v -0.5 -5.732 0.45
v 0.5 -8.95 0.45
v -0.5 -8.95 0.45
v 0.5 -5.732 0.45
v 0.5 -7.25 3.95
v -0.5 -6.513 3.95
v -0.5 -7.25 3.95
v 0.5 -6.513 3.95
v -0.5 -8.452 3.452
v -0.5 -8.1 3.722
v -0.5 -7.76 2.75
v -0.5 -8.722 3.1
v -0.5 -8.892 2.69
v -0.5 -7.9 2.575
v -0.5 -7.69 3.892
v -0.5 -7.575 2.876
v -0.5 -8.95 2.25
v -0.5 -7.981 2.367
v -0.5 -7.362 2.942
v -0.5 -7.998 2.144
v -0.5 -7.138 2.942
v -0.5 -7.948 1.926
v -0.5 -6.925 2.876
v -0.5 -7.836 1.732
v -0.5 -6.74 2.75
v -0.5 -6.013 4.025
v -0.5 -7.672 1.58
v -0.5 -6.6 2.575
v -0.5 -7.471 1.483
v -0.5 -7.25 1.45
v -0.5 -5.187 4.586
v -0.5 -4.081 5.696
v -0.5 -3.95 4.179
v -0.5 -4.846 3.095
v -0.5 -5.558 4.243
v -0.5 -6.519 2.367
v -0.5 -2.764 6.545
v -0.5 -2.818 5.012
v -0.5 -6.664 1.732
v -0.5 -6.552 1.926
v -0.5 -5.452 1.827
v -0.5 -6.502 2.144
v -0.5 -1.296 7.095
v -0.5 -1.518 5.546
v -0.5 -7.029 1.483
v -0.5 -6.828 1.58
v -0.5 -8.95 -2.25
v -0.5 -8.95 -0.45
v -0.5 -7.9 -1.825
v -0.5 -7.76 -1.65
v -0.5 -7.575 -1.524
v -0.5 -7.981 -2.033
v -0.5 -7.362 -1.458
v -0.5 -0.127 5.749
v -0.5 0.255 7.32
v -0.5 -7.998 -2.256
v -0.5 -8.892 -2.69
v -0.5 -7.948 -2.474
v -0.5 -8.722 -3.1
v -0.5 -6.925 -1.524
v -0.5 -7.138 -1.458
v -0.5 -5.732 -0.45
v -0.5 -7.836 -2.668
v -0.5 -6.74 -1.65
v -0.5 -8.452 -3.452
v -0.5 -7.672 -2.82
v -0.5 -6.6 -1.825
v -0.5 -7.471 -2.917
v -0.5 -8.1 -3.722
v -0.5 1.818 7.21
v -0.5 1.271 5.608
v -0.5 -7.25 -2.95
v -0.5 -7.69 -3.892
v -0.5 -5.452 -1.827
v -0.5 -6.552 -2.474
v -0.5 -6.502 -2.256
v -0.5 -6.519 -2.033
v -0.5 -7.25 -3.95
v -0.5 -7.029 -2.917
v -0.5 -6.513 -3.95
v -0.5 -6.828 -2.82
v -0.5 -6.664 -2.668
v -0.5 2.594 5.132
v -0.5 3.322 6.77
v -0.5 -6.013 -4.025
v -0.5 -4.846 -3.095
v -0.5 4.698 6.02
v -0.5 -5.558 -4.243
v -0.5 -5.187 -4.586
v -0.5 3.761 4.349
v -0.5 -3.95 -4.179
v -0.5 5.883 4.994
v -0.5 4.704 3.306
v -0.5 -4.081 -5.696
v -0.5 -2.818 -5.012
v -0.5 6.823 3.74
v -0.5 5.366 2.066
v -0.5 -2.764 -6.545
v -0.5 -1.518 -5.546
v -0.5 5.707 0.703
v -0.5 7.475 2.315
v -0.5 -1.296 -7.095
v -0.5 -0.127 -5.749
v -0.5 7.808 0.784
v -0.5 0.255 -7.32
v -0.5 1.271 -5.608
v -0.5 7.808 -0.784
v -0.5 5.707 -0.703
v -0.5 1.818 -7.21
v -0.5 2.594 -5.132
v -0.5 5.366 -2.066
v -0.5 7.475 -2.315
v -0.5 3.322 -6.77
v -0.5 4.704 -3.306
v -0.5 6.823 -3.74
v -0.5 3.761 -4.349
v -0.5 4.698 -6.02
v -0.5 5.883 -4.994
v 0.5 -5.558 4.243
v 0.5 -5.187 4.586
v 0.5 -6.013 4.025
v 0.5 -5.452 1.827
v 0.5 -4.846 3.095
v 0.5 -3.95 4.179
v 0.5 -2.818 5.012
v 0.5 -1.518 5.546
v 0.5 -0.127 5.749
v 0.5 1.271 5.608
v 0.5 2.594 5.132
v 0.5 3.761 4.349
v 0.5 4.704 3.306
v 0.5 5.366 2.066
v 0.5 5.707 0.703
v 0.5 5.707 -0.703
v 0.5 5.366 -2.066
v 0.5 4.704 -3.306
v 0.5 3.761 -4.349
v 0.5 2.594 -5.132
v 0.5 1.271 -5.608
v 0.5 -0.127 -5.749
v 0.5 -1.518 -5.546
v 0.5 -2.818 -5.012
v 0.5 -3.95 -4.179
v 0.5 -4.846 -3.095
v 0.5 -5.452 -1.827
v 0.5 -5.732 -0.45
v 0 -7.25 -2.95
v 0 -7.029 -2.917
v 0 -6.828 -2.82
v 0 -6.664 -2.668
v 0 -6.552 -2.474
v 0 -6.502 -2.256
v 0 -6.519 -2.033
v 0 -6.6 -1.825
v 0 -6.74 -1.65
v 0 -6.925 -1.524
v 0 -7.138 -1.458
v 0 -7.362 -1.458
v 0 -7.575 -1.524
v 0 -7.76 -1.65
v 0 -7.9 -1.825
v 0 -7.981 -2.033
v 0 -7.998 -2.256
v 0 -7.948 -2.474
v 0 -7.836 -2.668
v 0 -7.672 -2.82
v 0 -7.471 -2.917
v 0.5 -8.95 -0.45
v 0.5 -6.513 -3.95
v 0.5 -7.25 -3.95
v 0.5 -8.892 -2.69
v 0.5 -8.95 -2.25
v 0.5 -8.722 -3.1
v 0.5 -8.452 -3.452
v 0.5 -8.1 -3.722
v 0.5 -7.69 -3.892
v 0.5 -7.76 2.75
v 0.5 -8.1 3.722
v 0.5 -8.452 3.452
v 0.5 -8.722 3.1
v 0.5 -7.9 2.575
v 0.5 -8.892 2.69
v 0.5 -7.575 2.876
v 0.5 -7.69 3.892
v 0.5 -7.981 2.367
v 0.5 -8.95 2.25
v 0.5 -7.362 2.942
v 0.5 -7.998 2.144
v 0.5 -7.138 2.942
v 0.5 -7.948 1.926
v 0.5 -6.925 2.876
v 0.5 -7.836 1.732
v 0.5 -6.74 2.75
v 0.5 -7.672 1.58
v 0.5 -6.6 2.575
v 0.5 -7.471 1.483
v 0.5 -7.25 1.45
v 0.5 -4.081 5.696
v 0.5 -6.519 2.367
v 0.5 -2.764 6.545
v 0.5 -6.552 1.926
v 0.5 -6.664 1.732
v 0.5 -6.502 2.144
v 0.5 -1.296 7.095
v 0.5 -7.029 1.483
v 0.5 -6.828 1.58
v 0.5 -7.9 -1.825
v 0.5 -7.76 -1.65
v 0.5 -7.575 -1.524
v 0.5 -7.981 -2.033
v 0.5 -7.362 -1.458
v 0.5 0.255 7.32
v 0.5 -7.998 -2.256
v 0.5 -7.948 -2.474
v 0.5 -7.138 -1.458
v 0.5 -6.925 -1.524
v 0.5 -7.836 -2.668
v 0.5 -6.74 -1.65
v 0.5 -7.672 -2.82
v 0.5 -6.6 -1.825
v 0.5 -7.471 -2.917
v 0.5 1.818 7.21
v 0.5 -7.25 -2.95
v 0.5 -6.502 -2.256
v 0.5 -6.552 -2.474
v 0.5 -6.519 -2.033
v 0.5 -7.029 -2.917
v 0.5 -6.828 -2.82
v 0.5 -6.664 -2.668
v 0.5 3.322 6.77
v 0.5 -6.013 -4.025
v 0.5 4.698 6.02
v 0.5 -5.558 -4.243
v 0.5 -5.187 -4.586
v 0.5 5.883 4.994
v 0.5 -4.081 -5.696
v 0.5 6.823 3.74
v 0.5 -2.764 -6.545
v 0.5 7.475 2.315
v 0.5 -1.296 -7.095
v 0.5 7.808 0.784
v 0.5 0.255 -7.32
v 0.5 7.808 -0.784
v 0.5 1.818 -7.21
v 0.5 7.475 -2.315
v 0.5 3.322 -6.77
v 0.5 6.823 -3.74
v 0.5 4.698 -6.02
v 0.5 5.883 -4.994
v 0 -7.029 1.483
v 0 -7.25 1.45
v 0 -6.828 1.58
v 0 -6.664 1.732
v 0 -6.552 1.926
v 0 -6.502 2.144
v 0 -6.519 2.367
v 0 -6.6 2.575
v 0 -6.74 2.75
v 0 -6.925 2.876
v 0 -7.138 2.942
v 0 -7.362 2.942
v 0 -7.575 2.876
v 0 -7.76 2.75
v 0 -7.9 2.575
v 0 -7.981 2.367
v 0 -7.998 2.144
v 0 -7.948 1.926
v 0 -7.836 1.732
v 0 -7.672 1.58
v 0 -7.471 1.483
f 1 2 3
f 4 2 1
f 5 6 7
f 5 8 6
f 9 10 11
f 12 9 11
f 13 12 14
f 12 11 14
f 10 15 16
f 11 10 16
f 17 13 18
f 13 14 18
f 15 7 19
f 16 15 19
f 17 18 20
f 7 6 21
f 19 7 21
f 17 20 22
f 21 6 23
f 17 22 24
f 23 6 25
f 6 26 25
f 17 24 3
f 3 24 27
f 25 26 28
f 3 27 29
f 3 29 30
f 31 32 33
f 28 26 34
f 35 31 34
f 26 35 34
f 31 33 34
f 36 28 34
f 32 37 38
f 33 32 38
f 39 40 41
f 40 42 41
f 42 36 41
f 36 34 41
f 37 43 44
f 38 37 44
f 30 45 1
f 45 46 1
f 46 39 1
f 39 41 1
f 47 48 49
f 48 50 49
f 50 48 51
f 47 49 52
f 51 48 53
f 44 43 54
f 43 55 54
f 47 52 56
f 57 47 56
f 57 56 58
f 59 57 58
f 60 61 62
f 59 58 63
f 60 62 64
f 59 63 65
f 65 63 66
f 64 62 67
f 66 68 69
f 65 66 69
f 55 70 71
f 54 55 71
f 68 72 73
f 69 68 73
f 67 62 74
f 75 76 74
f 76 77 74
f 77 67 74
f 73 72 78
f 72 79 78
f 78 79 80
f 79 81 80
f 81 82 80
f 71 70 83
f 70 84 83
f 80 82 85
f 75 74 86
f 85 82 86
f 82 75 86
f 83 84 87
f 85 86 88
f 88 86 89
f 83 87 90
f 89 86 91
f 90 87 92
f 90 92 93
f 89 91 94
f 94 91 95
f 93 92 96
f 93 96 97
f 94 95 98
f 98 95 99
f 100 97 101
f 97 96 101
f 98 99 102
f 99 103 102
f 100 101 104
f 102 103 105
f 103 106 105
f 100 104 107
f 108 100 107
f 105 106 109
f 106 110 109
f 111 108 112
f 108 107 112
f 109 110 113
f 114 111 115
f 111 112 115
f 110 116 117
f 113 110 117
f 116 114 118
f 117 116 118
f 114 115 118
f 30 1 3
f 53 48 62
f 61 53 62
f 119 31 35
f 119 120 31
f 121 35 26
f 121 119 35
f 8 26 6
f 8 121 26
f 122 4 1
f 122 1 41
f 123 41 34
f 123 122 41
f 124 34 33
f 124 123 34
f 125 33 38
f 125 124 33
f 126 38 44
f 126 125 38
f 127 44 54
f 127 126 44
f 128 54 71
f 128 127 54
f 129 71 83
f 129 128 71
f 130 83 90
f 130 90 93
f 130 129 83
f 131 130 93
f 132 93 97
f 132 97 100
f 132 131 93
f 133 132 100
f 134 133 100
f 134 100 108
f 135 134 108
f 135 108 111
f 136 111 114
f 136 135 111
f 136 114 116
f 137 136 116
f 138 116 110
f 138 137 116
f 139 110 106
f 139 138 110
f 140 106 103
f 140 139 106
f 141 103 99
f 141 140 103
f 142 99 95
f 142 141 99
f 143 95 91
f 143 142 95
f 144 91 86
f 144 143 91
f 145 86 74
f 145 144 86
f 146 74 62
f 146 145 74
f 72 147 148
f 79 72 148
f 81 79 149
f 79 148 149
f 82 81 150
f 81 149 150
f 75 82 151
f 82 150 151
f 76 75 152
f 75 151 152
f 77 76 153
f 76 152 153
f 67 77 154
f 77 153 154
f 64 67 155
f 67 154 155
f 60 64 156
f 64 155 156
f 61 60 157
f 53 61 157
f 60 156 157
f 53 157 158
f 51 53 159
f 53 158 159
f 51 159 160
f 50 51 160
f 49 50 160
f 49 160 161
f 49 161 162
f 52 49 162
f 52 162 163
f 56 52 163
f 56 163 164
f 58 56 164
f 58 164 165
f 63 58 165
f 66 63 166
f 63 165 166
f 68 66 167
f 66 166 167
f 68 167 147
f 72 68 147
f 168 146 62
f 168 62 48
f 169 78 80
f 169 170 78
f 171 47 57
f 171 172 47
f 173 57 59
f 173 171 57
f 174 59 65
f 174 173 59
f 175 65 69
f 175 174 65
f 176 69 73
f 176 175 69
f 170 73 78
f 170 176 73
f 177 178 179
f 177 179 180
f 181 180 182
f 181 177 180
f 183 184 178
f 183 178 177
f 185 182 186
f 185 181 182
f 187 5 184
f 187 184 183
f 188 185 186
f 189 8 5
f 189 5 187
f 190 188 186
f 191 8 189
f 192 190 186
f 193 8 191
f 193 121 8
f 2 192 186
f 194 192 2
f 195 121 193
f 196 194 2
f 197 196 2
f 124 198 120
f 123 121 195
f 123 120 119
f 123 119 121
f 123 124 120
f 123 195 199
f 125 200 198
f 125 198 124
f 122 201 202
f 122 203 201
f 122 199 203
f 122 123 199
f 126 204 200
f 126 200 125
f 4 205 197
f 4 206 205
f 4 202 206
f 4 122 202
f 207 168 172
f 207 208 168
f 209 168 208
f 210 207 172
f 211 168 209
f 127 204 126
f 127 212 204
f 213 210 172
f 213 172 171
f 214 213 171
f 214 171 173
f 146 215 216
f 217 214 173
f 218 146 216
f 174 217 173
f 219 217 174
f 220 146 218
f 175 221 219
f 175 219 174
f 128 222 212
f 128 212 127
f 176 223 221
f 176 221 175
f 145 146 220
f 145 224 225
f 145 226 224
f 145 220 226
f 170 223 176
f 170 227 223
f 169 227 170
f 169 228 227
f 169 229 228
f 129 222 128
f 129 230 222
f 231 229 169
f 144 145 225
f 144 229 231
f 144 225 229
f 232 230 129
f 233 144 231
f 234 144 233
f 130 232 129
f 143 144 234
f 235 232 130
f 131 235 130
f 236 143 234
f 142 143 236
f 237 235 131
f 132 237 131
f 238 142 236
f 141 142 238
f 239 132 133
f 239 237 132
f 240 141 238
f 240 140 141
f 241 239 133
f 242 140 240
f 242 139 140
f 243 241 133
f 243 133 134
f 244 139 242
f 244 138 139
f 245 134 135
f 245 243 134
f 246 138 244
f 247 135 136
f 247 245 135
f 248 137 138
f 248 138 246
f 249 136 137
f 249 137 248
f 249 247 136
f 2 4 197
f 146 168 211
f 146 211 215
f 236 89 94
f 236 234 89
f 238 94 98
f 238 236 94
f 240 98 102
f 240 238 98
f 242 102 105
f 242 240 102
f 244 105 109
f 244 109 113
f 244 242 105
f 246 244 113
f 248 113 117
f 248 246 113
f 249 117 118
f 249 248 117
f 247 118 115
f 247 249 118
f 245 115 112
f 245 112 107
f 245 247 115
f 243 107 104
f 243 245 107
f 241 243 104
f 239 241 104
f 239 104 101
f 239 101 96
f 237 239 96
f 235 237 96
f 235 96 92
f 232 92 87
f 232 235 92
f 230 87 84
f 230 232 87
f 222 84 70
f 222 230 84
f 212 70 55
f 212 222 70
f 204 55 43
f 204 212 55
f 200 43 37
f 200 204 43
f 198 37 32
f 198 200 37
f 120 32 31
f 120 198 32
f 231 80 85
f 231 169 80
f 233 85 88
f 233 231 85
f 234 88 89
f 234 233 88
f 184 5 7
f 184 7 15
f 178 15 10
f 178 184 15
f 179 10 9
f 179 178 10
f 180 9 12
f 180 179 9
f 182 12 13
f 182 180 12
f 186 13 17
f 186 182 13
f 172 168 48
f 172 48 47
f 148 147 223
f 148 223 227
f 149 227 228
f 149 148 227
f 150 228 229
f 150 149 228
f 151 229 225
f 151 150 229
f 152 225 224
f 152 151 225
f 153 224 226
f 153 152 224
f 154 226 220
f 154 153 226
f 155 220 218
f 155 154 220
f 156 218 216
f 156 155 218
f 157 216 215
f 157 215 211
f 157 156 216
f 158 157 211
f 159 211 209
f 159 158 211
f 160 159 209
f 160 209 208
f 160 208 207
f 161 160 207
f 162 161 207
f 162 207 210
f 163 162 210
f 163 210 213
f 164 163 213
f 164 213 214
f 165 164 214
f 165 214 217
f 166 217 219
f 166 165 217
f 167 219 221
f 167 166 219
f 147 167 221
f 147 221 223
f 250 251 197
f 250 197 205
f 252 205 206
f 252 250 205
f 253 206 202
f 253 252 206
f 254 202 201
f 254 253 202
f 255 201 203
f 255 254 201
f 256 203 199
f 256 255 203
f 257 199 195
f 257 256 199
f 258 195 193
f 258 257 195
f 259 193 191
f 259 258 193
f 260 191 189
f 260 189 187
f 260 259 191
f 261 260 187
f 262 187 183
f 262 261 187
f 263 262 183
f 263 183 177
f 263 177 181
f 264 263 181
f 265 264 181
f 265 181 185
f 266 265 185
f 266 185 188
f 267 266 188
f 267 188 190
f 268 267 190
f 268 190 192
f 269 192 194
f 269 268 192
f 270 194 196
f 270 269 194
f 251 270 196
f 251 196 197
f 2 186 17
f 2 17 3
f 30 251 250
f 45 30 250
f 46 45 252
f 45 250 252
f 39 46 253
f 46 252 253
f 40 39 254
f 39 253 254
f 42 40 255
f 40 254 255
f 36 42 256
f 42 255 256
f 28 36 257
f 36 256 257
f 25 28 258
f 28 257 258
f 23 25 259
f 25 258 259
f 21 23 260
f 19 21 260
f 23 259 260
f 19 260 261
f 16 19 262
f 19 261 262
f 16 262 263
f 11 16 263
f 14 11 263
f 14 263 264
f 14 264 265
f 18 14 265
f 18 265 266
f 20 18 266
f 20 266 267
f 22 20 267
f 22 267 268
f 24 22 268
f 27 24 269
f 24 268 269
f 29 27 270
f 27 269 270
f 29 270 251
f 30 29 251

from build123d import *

# Parameters (mm, degrees)
EXTRUDE_1_DEPTH      = 0.5
EXTRUDE_1_DEPTH_BACK = 0.5
SKETCH_1_R           = 0.75


with BuildPart() as part:
    # ｽｹｯﾁ1 → ﾎﾞｽ - 押し出し1 (new, two sides: drawn at the far end of the back side and taken through both)
    with BuildSketch(Plane(origin=(0, 0, 0), x_dir=(0, 0, -1), z_dir=(1, 0, 0)).offset(-EXTRUDE_1_DEPTH_BACK)):
        with BuildLine():
            Line((-3.95, -6.512622113), (-3.95, -7.25))
            ThreePointArc((-3.95, -7.25), (-3.452081528, -8.452081528), (-2.25, -8.95))
            Line((-2.25, -8.95), (-0.45, -8.95))
            Line((-0.45, -8.95), (-0.45, -5.732364259))
            ThreePointArc((-0.45, -5.732364259), (0, 5.75), (0.45, -5.732364259))
            Line((0.45, -5.732364259), (0.45, -8.95))
            Line((0.45, -8.95), (2.25, -8.95))
            ThreePointArc((2.25, -8.95), (3.452081528, -8.452081528), (3.95, -7.25))
            Line((3.95, -7.25), (3.95, -6.512622113))
            ThreePointArc((3.95, -6.512622113), (4.117151006, -5.777520785), (4.585734072, -5.186975842))
            ThreePointArc((4.585734072, -5.186975842), (0, 7.85), (-4.585734072, -5.186975842))
            ThreePointArc((-4.585734072, -5.186975842), (-4.117151006, -5.777520785), (-3.95, -6.512622113))
        make_face()
        with Locations((2.2, -7.25)):
            Circle(SKETCH_1_R, mode=Mode.SUBTRACT)
        with Locations((-2.2, -7.25)):
            Circle(SKETCH_1_R, mode=Mode.SUBTRACT)
    extrude(amount=EXTRUDE_1_DEPTH + EXTRUDE_1_DEPTH_BACK)


solid = part.part
